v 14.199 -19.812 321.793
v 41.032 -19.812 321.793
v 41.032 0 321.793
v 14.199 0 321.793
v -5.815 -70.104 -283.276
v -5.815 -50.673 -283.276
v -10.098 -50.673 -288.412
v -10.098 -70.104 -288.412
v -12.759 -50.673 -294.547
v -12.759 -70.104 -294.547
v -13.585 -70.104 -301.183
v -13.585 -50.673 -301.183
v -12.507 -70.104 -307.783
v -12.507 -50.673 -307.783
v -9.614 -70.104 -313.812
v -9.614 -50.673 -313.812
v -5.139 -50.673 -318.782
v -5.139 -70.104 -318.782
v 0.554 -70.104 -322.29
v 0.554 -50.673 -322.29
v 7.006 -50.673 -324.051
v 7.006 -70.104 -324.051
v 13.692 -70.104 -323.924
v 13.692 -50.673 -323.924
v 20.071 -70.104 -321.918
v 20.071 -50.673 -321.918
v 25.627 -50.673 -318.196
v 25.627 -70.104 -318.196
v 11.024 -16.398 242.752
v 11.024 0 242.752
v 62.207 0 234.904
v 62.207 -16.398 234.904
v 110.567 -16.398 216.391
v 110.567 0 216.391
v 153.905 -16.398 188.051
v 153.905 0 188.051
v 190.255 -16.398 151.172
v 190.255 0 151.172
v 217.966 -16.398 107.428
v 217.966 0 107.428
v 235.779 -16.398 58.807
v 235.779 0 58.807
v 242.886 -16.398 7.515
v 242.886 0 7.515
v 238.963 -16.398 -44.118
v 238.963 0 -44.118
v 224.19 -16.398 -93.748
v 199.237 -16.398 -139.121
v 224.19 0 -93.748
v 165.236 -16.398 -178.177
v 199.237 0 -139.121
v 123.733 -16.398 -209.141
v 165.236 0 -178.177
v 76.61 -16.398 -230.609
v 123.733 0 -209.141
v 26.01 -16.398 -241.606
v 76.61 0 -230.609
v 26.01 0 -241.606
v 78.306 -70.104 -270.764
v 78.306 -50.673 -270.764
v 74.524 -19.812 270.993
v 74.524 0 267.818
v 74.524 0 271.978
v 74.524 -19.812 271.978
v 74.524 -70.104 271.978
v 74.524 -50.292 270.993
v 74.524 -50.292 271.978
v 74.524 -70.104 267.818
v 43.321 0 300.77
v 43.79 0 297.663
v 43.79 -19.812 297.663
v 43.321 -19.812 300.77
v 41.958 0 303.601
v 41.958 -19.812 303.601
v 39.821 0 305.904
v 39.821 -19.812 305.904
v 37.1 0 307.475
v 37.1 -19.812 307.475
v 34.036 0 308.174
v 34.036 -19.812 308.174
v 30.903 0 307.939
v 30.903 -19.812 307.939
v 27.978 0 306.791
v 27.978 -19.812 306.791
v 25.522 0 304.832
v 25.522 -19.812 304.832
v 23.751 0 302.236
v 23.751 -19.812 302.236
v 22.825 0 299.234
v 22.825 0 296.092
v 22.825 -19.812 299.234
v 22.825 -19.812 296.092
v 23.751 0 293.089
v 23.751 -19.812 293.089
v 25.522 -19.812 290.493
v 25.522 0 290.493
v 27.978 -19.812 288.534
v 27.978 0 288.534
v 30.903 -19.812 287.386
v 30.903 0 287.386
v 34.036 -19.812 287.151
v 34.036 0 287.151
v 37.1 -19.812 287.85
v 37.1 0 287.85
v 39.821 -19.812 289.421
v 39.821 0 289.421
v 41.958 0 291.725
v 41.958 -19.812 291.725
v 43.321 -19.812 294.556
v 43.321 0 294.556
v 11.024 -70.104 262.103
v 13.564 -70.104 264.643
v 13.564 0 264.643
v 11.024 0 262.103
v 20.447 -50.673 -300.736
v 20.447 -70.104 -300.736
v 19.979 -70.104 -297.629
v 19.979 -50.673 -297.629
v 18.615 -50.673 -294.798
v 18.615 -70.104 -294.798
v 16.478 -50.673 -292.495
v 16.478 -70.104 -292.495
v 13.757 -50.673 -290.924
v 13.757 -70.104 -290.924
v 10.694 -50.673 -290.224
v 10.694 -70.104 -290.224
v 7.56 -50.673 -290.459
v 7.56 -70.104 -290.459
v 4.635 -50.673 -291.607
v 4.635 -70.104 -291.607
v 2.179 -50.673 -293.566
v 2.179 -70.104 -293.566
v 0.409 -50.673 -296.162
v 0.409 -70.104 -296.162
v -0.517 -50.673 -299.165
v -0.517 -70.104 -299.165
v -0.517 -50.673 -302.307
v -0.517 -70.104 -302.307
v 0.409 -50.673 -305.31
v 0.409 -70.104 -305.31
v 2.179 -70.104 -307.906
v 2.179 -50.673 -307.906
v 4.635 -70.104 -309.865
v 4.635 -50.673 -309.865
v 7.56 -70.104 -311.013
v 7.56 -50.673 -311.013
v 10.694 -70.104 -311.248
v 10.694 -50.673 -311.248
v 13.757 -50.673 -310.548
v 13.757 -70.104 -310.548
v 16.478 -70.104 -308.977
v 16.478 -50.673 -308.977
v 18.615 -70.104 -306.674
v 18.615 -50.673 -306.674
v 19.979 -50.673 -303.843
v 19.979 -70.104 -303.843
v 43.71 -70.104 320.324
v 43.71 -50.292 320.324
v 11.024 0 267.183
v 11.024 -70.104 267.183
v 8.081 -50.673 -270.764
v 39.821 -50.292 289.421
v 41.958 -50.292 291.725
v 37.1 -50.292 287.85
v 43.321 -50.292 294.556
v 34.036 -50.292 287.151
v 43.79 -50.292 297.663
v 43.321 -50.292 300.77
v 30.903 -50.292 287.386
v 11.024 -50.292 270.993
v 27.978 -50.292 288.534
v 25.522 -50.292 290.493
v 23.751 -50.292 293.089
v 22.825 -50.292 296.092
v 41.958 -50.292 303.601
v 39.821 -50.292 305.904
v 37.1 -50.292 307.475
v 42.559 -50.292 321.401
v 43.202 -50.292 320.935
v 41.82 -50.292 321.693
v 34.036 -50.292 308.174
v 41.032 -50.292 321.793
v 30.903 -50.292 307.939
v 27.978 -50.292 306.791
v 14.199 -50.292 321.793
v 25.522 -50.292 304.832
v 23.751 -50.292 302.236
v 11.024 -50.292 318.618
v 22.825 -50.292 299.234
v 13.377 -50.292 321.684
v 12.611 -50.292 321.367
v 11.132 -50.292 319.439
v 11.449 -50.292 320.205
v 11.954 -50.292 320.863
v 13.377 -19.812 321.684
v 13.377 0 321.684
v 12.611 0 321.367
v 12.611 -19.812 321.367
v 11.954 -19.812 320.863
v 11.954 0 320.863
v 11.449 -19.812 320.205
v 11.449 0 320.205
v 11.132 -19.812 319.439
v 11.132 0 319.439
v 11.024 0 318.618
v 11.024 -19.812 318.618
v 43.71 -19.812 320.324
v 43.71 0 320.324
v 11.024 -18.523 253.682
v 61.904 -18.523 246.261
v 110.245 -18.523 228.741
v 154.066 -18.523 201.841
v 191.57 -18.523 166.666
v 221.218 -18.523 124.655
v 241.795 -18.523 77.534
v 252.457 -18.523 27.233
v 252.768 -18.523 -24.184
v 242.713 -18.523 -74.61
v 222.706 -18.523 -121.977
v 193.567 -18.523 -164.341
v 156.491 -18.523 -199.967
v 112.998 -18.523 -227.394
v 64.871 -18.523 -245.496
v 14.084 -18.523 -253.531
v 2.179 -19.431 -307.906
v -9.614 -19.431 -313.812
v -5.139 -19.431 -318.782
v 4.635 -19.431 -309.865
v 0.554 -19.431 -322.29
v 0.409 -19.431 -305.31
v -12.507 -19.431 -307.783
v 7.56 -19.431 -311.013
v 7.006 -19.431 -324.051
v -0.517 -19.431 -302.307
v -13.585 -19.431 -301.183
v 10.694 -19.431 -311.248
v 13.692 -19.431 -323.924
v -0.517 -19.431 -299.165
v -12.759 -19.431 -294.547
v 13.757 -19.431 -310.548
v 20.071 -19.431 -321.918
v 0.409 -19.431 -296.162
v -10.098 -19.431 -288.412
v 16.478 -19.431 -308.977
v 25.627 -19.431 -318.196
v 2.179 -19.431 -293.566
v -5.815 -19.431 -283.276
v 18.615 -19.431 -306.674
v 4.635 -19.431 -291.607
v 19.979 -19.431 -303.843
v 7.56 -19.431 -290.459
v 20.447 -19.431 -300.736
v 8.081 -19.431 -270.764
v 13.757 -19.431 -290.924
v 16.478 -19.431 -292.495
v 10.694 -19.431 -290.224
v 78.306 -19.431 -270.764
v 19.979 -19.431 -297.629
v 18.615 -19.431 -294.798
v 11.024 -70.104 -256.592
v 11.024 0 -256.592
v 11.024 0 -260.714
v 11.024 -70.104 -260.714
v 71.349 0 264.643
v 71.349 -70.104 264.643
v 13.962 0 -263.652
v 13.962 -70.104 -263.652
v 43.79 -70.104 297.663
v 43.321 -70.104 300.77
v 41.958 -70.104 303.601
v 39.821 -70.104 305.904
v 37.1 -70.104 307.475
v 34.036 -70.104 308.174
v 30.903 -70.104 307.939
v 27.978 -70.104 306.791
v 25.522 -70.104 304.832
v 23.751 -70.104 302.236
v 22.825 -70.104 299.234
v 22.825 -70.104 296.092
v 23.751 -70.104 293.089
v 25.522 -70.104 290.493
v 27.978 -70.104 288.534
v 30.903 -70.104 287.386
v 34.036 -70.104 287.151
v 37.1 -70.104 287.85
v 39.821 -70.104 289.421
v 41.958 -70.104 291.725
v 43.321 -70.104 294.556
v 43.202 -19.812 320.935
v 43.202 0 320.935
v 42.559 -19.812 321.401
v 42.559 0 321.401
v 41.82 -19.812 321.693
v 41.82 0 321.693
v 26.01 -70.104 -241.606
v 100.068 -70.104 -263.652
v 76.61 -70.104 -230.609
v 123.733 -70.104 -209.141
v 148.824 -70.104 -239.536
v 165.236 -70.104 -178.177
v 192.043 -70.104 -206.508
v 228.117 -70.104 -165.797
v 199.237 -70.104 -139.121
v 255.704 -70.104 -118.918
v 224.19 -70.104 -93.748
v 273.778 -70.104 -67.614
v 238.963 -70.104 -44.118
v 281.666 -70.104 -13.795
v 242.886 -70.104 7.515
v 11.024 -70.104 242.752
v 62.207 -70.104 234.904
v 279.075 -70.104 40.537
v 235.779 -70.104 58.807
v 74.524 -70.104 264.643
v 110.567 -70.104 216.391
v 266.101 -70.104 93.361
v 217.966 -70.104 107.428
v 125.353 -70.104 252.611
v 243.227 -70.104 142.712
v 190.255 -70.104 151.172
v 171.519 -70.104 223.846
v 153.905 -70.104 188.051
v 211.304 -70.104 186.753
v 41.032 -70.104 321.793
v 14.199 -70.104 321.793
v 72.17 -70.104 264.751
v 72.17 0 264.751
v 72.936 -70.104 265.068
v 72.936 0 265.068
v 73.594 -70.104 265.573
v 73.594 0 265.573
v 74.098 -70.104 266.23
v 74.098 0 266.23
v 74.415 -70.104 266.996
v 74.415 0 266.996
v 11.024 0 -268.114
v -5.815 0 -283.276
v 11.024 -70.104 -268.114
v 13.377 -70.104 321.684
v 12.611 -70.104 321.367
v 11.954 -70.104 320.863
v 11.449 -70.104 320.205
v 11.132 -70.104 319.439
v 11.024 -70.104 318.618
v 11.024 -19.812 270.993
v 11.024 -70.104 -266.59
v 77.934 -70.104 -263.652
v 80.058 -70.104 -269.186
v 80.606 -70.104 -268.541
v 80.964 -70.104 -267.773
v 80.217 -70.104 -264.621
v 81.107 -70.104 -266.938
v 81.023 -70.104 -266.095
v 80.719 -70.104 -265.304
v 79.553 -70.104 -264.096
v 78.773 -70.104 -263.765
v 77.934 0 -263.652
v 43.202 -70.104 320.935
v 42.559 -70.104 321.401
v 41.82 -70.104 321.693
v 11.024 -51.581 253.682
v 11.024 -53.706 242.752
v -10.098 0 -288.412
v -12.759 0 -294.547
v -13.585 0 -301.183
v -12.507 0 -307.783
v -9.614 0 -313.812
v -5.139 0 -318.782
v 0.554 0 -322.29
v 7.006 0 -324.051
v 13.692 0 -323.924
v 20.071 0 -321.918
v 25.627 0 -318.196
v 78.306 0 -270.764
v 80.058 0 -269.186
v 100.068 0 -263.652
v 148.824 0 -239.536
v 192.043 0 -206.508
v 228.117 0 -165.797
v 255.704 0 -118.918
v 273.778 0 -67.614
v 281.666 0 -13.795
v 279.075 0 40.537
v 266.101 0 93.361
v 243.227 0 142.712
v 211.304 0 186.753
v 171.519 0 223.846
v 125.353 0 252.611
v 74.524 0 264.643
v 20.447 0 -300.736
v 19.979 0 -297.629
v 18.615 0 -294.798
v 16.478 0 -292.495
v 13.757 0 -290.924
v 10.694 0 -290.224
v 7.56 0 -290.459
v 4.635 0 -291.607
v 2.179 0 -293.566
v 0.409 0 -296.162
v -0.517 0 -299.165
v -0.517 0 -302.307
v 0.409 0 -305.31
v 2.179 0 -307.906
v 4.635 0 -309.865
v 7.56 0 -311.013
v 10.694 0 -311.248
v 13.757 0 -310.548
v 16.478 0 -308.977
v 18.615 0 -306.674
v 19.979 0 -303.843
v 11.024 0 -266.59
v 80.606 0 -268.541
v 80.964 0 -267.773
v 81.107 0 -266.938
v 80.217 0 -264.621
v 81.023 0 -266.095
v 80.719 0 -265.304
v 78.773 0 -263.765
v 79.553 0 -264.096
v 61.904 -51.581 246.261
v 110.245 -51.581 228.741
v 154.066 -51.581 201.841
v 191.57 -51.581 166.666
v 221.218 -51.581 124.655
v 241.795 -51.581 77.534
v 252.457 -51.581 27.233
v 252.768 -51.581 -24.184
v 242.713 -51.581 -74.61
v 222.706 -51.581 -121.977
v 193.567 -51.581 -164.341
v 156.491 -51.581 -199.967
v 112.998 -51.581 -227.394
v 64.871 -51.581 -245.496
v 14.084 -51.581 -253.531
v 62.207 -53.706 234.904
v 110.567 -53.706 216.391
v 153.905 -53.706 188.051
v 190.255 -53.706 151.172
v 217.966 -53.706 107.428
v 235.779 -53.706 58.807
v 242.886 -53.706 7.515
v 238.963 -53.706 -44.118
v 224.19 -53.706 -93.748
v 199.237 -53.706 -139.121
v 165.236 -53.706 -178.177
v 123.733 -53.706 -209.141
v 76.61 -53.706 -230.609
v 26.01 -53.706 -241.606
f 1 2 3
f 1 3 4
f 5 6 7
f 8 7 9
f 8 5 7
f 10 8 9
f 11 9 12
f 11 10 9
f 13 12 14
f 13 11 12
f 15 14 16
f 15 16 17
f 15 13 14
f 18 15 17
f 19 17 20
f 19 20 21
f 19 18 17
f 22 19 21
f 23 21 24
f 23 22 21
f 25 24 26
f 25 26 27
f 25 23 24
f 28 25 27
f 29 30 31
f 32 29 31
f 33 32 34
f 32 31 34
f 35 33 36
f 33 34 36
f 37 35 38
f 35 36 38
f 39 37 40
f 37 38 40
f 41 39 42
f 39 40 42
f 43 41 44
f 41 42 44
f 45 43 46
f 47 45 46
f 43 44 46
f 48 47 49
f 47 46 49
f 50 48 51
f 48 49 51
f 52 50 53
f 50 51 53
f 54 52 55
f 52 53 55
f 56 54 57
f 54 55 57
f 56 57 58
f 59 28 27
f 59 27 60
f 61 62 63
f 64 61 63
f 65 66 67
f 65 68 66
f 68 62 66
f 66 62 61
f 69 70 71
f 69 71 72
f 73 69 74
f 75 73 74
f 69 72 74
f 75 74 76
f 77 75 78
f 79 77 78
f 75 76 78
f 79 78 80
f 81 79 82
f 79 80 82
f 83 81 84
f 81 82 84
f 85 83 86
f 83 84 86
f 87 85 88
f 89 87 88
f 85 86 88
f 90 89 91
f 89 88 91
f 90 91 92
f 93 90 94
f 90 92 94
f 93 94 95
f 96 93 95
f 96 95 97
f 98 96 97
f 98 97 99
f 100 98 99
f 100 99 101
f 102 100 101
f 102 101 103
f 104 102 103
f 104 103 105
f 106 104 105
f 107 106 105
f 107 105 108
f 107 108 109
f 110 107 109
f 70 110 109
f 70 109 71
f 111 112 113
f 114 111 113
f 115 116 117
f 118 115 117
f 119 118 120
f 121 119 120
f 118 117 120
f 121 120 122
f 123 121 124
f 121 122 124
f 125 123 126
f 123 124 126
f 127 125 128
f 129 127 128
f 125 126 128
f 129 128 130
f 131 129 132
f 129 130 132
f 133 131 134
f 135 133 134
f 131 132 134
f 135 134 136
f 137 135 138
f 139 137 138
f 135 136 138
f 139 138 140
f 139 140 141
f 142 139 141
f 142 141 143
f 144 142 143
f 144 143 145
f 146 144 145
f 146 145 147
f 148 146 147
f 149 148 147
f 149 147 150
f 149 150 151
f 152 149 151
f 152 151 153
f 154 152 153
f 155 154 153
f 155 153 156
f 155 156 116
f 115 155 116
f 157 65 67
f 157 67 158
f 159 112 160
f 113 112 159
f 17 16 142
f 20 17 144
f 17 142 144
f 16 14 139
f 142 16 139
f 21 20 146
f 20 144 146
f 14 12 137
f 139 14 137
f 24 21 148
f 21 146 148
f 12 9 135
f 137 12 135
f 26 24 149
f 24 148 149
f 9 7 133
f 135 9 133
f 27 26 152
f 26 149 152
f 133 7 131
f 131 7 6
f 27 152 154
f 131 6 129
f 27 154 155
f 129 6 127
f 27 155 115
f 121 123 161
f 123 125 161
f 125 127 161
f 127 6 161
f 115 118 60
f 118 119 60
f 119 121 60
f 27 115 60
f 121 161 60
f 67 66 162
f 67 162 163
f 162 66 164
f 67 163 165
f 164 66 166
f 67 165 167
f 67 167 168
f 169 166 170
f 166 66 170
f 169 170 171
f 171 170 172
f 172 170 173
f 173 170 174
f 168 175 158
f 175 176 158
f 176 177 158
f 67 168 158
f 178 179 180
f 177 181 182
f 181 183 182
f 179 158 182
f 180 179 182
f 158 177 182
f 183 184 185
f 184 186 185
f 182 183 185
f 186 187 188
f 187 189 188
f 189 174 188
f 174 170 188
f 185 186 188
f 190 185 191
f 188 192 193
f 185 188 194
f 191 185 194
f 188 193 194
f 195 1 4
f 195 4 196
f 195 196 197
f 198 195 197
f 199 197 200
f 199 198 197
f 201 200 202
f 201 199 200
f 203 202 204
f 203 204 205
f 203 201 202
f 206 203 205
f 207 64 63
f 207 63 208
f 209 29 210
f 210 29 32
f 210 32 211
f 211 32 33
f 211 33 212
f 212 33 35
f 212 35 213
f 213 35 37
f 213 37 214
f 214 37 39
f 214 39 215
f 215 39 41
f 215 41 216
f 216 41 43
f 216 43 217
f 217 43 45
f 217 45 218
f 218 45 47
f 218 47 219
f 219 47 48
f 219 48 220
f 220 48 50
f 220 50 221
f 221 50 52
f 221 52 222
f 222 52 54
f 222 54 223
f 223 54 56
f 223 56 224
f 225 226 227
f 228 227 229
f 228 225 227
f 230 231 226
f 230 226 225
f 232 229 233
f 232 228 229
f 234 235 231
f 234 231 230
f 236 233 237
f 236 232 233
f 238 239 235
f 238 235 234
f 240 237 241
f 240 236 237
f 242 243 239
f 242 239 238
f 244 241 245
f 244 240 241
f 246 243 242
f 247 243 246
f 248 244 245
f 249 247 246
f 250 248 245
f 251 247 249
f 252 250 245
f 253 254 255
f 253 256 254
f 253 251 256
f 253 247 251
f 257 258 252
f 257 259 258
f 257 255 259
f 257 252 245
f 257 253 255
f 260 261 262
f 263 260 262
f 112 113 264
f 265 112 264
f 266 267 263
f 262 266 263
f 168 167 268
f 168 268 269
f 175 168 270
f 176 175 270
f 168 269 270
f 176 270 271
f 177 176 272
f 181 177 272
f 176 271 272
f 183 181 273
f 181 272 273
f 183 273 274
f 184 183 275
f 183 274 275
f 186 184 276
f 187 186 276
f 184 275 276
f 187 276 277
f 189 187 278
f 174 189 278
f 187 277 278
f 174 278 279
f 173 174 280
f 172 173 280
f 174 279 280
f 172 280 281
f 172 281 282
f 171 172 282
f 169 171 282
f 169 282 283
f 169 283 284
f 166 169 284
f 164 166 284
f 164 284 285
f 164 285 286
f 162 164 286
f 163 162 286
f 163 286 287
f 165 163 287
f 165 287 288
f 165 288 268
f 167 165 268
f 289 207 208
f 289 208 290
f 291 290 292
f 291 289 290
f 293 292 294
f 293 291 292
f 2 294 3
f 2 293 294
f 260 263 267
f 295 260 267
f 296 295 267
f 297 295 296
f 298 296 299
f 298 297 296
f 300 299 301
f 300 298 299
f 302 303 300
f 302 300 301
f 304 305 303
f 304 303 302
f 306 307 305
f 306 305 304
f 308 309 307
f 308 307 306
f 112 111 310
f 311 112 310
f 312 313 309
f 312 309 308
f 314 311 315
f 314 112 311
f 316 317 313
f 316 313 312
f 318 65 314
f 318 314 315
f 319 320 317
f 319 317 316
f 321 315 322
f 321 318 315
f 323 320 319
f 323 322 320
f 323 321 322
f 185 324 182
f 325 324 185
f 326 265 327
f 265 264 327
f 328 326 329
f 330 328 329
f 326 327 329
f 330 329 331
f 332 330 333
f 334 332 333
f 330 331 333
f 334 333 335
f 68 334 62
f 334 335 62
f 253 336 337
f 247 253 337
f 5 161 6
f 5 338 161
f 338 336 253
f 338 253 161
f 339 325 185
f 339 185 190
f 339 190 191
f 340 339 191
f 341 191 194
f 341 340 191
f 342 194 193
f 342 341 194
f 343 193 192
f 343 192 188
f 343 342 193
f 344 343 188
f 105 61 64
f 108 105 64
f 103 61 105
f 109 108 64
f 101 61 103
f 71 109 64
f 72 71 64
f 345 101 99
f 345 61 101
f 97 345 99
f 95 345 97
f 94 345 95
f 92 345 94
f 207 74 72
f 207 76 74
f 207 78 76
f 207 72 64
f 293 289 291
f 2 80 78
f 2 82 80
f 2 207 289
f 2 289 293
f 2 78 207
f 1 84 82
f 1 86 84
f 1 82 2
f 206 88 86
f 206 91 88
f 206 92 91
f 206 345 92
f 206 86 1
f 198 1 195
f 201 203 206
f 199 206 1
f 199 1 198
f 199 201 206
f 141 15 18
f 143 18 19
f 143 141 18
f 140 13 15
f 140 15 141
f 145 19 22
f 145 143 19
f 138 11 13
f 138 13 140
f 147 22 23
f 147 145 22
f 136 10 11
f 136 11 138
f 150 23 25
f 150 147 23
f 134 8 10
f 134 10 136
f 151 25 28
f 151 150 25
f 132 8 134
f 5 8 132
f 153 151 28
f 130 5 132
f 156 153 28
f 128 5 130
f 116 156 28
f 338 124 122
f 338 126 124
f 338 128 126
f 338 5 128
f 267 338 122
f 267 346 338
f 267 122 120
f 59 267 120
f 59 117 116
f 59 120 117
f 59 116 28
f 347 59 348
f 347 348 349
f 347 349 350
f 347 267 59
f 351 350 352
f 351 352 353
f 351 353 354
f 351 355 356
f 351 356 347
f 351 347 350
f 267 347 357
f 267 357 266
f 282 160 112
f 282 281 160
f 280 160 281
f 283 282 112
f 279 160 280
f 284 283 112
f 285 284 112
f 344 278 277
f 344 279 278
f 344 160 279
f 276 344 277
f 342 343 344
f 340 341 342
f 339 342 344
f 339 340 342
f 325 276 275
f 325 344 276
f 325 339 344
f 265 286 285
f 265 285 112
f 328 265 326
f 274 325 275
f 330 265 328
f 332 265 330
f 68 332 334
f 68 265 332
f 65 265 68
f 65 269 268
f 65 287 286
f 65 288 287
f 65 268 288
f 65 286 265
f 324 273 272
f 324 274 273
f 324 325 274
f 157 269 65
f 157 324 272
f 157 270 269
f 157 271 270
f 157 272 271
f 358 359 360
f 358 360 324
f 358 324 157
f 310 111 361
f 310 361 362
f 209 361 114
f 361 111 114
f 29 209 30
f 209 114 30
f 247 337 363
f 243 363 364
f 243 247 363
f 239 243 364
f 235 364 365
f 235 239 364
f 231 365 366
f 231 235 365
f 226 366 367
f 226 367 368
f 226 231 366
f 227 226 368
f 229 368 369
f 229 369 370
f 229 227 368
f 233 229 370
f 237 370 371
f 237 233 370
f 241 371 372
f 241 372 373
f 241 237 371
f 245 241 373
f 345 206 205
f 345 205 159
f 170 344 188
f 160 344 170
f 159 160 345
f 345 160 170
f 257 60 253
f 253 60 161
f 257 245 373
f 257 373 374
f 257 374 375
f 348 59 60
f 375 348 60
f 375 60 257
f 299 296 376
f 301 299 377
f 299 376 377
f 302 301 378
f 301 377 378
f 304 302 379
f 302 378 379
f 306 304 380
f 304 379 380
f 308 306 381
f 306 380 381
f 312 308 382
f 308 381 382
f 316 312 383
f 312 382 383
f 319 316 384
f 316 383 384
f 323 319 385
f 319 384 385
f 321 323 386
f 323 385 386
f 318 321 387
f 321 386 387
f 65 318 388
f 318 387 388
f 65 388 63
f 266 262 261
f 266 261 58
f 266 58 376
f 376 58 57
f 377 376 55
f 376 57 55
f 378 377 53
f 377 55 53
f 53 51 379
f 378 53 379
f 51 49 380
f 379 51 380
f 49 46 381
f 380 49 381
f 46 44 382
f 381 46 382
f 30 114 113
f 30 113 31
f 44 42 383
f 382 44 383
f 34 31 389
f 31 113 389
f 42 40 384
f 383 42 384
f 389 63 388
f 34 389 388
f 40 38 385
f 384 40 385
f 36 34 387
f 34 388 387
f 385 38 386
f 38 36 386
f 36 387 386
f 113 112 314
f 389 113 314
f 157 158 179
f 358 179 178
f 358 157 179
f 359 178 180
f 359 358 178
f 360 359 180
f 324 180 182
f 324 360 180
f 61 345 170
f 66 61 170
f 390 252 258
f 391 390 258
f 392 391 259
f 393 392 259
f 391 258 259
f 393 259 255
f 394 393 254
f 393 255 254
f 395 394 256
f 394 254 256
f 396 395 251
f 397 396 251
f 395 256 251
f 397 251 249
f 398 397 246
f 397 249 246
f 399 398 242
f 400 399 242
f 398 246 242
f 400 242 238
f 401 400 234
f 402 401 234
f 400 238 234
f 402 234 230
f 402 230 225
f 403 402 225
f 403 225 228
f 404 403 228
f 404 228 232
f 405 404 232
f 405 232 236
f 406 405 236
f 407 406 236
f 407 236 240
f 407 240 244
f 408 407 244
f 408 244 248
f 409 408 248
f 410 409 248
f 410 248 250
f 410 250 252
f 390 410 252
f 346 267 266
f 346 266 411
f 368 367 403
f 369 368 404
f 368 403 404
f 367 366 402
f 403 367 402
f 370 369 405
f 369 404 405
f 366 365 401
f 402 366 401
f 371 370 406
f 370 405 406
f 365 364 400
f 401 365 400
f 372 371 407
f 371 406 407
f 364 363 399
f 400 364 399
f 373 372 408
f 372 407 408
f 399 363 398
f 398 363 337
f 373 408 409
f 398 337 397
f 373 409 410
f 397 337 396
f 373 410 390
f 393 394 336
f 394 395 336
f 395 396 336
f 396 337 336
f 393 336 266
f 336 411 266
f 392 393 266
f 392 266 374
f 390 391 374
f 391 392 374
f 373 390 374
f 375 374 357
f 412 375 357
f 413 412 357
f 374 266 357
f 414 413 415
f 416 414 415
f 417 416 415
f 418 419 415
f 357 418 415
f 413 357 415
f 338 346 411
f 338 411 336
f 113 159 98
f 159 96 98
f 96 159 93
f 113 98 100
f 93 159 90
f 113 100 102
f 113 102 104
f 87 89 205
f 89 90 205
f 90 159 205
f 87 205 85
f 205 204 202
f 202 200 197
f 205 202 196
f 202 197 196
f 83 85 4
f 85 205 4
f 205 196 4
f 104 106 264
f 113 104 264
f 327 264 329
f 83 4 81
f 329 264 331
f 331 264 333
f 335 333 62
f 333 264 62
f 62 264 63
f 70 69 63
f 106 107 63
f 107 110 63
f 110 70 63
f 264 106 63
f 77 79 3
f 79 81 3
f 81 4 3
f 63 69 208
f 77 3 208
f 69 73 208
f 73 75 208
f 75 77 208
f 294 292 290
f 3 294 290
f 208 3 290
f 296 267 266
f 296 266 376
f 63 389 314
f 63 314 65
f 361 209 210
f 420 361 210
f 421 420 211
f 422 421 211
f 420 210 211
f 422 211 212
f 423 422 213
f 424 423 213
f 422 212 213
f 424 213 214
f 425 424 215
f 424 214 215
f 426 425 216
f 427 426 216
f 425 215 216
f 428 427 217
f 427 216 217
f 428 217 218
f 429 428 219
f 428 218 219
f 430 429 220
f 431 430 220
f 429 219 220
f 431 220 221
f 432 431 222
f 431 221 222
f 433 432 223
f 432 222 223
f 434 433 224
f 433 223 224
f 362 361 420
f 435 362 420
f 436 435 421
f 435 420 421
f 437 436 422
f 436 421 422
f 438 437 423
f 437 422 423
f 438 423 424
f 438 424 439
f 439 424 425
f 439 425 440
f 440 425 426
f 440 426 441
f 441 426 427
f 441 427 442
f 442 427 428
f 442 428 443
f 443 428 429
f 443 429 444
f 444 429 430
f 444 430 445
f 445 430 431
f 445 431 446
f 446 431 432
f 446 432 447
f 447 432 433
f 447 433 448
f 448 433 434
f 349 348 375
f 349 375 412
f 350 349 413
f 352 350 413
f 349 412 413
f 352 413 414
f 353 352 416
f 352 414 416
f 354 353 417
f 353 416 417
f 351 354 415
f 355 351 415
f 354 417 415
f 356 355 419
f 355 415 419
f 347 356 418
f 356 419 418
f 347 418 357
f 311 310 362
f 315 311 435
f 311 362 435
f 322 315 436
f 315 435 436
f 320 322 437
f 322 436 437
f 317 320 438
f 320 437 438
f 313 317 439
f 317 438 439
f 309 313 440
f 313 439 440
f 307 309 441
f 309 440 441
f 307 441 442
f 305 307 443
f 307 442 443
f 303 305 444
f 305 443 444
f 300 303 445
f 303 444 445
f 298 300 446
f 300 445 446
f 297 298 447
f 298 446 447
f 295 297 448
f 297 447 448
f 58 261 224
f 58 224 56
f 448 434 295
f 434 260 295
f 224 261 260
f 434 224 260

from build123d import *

# Parameters (mm, degrees)
F1_DEPTH  = 70.104
F4_W      = 109.6982747611
F4_H      = 35.960230231
F4_W_2    = 177.7120623738
F4_H_2    = 46.1589694023
F5_DEPTH  = 70.1050001
F6_W      = 60.452
F6_H      = 51.054
F7_DEPTH  = 59.944
F9_DEPTH  = 270.9809
F10_R     = 20.955
F11_DEPTH = 2.54
F13_R     = 10.541
F15_DEPTH = 70.104
F17_DEPTH = 70.1050001
F14_R     = 10.541
F19_DEPTH = 15.621
F20_R     = 3.175
F21_R     = 10.541
F22_DEPTH = 70.104
F23_SIZE  = 2.54
F24_R     = 3.175
F25_W     = 30.48
F25_H     = 50.8
F26_DEPTH = 270.9809
F27_SIZE  = 2.54


with BuildPart() as f1:
    # F0 (on Front) → F1 (new body)
    with BuildSketch(Plane.XZ):
        with BuildLine():
            Line((11.0236, -242.7516324276), (11.0236, -281.7879597415))
            ThreePointArc((11.0236, -281.7879597415), (282.0035, 0), (11.0236, 281.7879597415))
            Line((11.0236, 281.7879597415), (11.0236, 242.7516324276))
            ThreePointArc((11.0236, 242.7516324276), (243.0018, 0), (11.0236, -242.7516324276))
        make_face()
    extrude(amount=F1_DEPTH)

    # F2 (on face) → F3 (revolve, cut)
    with BuildSketch(Plane(origin=(11.0236, 0, 0), x_dir=(0, -1, 0), z_dir=(-1, 0, 0))):
        Polygon((18.52295, 253.6825), (16.3982045821, 242.7516324276), (53.7057954179, 242.7516324276), (51.58105, 253.6825), align=None)
    revolve(axis=Axis((0, -70.104, 0), (0, 1, 0)), mode=Mode.SUBTRACT)

    # F4 (on face) → F5 (cut, through all)
    with BuildSketch(Plane.XZ.offset(70.104)):
        with Locations((19.6744626195, 282.6227151155)):
            Rectangle(F4_W, F4_H)
        with Locations((63.4474558756, -286.7314847012)):
            Rectangle(F4_W_2, F4_H_2)
    extrude(amount=-F5_DEPTH, mode=Mode.SUBTRACT)

    # F16 (on face) → F17 (cut, through all)
    with BuildSketch(Plane.XZ.offset(70.104)):
        with BuildLine():
            Line((11.0236, -242.7516324276), (11.0236, -256.5918267325))
            Line((11.0236, -256.5918267325), (26.0096, -241.6058267325))
            ThreePointArc((26.0096, -241.6058267325), (18.5254606753, -242.2946184091), (11.0236, -242.7516324276))
        make_face()
        Polygon((11.0236, -263.652), (13.961667458, -263.652), (11.0236, -260.713932542), align=None)
    extrude(amount=-F17_DEPTH, mode=Mode.SUBTRACT)

    # F27
    f27_edges = [f1.edges().sort_by_distance(p)[0] for p in [
        (11.0236, -35.052, 264.6426),
    ]]
    chamfer(f27_edges, length=F27_SIZE)


with BuildPart() as f7:
    # F6 (on face) → F7 (new body)
    with BuildSketch(Plane(origin=(11.0236, 0, 0), x_dir=(0, -1, 0), z_dir=(-1, 0, 0))):
        with Locations((35.052, 290.1696)):
            Rectangle(F6_W, F6_H)
    extrude(amount=-F7_DEPTH)

    # F8 (on face) → F9 (cut, through all)
    with BuildSketch(Plane(origin=(11.0236, 0, 0), x_dir=(0, -1, 0), z_dir=(-1, 0, 0))):
        with BuildLine():
            Line((21.59, 315.6966), (21.59, 299.974))
            ThreePointArc((21.59, 299.974), (35.052, 286.512), (48.514, 299.974))
            Line((48.514, 299.974), (48.514, 315.6966))
            Line((48.514, 315.6966), (21.59, 315.6966))
        make_face()
    extrude(amount=-F9_DEPTH, mode=Mode.SUBTRACT)

    # F10 (on face) → F11 (cut)
    with BuildSketch(Plane.YZ.offset(70.9676)):
        with Locations((-35.052, 299.974)):
            Circle(F10_R)
    extrude(amount=-F11_DEPTH, mode=Mode.SUBTRACT)


with BuildPart() as f15:
    # F13 (on face) → F15 (new body)
    with BuildSketch(Plane.XZ.offset(70.104)):
        with BuildLine():
            Line((25.6272235964, -318.1961876746), (78.3060048335, -270.764))
            Line((78.3060048335, -270.764), (86.204681039, -263.652))
            Line((86.204681039, -263.652), (13.961667458, -263.652))
            Line((13.961667458, -263.652), (11.0236, -266.590067458))
            Line((11.0236, -266.590067458), (11.0236, -268.114067458))
            Line((11.0236, -268.114067458), (-5.8152235964, -283.2758123254))
            ThreePointArc((-5.8152235964, -283.2758123254), (-7.5541876746, -316.4572235964), (25.6272235964, -318.1961876746))
        make_face()
        with Locations((9.906, -300.736)):
            Circle(F13_R, mode=Mode.SUBTRACT)
    extrude(amount=-F15_DEPTH)

    # F14 (on offset) → F19 (cut, symmetric)
    with BuildSketch(Plane.XZ.offset(35.052)):
        with BuildLine():
            Line((25.6272235964, -318.1961876746), (78.3060048335, -270.764))
            Line((78.3060048335, -270.764), (11.0236, -270.764))
            Line((11.0236, -270.764), (8.0805517554, -270.764))
            Line((8.0805517554, -270.764), (-5.8152235964, -283.2758123254))
            ThreePointArc((-5.8152235964, -283.2758123254), (-7.5541876746, -316.4572235964), (25.6272235964, -318.1961876746))
        make_face()
        with Locations((9.906, -300.736)):
            Circle(F14_R, mode=Mode.SUBTRACT)
    extrude(amount=F19_DEPTH, both=True, mode=Mode.SUBTRACT)

    # F20
    f20_edges = [f15.edges().sort_by_distance(p)[0] for p in [
        (86.204681, -35.052, -263.652),
    ]]
    fillet(f20_edges, radius=F20_R)


with BuildPart() as f22:
    # F21 (on face) → F22 (new body, through all)
    with BuildSketch(Plane.XZ.offset(70.104)):
        with BuildLine():
            Line((11.0236, 318.6176), (11.0236, 264.6426))
            Line((11.0236, 264.6426), (74.5236, 264.6426))
            Line((74.5236, 264.6426), (74.5236, 271.9783209289))
            Line((74.5236, 271.9783209289), (43.7095790687, 320.3240922036))
            ThreePointArc((43.7095790687, 320.3240922036), (42.5590170153, 321.4013688254), (41.0321718605, 321.7926))
            Line((41.0321718605, 321.7926), (14.1986, 321.7926))
            ThreePointArc((14.1986, 321.7926), (11.9535359697, 320.8626640303), (11.0236, 318.6176))
        make_face()
        with Locations((33.2486, 297.6626)):
            Circle(F21_R, mode=Mode.SUBTRACT)
    extrude(amount=-F22_DEPTH)

    # F23
    f23_edges = [f22.edges().sort_by_distance(p)[0] for p in [
        (11.0236, -35.052, 264.6426),
    ]]
    chamfer(f23_edges, length=F23_SIZE)

    # F24
    f24_edges = [f22.edges().sort_by_distance(p)[0] for p in [
        (74.5236, -35.052, 264.6426),
    ]]
    fillet(f24_edges, radius=F24_R)

    # F25 (on face) → F26 (cut, through all)
    with BuildSketch(Plane(origin=(11.0236, 0, 0), x_dir=(0, -1, 0), z_dir=(-1, 0, 0))):
        with Locations((35.052, 296.3926)):
            Rectangle(F25_W, F25_H)
    extrude(amount=-F26_DEPTH, mode=Mode.SUBTRACT)


solid = Compound([f1.part, f15.part, f22.part])
